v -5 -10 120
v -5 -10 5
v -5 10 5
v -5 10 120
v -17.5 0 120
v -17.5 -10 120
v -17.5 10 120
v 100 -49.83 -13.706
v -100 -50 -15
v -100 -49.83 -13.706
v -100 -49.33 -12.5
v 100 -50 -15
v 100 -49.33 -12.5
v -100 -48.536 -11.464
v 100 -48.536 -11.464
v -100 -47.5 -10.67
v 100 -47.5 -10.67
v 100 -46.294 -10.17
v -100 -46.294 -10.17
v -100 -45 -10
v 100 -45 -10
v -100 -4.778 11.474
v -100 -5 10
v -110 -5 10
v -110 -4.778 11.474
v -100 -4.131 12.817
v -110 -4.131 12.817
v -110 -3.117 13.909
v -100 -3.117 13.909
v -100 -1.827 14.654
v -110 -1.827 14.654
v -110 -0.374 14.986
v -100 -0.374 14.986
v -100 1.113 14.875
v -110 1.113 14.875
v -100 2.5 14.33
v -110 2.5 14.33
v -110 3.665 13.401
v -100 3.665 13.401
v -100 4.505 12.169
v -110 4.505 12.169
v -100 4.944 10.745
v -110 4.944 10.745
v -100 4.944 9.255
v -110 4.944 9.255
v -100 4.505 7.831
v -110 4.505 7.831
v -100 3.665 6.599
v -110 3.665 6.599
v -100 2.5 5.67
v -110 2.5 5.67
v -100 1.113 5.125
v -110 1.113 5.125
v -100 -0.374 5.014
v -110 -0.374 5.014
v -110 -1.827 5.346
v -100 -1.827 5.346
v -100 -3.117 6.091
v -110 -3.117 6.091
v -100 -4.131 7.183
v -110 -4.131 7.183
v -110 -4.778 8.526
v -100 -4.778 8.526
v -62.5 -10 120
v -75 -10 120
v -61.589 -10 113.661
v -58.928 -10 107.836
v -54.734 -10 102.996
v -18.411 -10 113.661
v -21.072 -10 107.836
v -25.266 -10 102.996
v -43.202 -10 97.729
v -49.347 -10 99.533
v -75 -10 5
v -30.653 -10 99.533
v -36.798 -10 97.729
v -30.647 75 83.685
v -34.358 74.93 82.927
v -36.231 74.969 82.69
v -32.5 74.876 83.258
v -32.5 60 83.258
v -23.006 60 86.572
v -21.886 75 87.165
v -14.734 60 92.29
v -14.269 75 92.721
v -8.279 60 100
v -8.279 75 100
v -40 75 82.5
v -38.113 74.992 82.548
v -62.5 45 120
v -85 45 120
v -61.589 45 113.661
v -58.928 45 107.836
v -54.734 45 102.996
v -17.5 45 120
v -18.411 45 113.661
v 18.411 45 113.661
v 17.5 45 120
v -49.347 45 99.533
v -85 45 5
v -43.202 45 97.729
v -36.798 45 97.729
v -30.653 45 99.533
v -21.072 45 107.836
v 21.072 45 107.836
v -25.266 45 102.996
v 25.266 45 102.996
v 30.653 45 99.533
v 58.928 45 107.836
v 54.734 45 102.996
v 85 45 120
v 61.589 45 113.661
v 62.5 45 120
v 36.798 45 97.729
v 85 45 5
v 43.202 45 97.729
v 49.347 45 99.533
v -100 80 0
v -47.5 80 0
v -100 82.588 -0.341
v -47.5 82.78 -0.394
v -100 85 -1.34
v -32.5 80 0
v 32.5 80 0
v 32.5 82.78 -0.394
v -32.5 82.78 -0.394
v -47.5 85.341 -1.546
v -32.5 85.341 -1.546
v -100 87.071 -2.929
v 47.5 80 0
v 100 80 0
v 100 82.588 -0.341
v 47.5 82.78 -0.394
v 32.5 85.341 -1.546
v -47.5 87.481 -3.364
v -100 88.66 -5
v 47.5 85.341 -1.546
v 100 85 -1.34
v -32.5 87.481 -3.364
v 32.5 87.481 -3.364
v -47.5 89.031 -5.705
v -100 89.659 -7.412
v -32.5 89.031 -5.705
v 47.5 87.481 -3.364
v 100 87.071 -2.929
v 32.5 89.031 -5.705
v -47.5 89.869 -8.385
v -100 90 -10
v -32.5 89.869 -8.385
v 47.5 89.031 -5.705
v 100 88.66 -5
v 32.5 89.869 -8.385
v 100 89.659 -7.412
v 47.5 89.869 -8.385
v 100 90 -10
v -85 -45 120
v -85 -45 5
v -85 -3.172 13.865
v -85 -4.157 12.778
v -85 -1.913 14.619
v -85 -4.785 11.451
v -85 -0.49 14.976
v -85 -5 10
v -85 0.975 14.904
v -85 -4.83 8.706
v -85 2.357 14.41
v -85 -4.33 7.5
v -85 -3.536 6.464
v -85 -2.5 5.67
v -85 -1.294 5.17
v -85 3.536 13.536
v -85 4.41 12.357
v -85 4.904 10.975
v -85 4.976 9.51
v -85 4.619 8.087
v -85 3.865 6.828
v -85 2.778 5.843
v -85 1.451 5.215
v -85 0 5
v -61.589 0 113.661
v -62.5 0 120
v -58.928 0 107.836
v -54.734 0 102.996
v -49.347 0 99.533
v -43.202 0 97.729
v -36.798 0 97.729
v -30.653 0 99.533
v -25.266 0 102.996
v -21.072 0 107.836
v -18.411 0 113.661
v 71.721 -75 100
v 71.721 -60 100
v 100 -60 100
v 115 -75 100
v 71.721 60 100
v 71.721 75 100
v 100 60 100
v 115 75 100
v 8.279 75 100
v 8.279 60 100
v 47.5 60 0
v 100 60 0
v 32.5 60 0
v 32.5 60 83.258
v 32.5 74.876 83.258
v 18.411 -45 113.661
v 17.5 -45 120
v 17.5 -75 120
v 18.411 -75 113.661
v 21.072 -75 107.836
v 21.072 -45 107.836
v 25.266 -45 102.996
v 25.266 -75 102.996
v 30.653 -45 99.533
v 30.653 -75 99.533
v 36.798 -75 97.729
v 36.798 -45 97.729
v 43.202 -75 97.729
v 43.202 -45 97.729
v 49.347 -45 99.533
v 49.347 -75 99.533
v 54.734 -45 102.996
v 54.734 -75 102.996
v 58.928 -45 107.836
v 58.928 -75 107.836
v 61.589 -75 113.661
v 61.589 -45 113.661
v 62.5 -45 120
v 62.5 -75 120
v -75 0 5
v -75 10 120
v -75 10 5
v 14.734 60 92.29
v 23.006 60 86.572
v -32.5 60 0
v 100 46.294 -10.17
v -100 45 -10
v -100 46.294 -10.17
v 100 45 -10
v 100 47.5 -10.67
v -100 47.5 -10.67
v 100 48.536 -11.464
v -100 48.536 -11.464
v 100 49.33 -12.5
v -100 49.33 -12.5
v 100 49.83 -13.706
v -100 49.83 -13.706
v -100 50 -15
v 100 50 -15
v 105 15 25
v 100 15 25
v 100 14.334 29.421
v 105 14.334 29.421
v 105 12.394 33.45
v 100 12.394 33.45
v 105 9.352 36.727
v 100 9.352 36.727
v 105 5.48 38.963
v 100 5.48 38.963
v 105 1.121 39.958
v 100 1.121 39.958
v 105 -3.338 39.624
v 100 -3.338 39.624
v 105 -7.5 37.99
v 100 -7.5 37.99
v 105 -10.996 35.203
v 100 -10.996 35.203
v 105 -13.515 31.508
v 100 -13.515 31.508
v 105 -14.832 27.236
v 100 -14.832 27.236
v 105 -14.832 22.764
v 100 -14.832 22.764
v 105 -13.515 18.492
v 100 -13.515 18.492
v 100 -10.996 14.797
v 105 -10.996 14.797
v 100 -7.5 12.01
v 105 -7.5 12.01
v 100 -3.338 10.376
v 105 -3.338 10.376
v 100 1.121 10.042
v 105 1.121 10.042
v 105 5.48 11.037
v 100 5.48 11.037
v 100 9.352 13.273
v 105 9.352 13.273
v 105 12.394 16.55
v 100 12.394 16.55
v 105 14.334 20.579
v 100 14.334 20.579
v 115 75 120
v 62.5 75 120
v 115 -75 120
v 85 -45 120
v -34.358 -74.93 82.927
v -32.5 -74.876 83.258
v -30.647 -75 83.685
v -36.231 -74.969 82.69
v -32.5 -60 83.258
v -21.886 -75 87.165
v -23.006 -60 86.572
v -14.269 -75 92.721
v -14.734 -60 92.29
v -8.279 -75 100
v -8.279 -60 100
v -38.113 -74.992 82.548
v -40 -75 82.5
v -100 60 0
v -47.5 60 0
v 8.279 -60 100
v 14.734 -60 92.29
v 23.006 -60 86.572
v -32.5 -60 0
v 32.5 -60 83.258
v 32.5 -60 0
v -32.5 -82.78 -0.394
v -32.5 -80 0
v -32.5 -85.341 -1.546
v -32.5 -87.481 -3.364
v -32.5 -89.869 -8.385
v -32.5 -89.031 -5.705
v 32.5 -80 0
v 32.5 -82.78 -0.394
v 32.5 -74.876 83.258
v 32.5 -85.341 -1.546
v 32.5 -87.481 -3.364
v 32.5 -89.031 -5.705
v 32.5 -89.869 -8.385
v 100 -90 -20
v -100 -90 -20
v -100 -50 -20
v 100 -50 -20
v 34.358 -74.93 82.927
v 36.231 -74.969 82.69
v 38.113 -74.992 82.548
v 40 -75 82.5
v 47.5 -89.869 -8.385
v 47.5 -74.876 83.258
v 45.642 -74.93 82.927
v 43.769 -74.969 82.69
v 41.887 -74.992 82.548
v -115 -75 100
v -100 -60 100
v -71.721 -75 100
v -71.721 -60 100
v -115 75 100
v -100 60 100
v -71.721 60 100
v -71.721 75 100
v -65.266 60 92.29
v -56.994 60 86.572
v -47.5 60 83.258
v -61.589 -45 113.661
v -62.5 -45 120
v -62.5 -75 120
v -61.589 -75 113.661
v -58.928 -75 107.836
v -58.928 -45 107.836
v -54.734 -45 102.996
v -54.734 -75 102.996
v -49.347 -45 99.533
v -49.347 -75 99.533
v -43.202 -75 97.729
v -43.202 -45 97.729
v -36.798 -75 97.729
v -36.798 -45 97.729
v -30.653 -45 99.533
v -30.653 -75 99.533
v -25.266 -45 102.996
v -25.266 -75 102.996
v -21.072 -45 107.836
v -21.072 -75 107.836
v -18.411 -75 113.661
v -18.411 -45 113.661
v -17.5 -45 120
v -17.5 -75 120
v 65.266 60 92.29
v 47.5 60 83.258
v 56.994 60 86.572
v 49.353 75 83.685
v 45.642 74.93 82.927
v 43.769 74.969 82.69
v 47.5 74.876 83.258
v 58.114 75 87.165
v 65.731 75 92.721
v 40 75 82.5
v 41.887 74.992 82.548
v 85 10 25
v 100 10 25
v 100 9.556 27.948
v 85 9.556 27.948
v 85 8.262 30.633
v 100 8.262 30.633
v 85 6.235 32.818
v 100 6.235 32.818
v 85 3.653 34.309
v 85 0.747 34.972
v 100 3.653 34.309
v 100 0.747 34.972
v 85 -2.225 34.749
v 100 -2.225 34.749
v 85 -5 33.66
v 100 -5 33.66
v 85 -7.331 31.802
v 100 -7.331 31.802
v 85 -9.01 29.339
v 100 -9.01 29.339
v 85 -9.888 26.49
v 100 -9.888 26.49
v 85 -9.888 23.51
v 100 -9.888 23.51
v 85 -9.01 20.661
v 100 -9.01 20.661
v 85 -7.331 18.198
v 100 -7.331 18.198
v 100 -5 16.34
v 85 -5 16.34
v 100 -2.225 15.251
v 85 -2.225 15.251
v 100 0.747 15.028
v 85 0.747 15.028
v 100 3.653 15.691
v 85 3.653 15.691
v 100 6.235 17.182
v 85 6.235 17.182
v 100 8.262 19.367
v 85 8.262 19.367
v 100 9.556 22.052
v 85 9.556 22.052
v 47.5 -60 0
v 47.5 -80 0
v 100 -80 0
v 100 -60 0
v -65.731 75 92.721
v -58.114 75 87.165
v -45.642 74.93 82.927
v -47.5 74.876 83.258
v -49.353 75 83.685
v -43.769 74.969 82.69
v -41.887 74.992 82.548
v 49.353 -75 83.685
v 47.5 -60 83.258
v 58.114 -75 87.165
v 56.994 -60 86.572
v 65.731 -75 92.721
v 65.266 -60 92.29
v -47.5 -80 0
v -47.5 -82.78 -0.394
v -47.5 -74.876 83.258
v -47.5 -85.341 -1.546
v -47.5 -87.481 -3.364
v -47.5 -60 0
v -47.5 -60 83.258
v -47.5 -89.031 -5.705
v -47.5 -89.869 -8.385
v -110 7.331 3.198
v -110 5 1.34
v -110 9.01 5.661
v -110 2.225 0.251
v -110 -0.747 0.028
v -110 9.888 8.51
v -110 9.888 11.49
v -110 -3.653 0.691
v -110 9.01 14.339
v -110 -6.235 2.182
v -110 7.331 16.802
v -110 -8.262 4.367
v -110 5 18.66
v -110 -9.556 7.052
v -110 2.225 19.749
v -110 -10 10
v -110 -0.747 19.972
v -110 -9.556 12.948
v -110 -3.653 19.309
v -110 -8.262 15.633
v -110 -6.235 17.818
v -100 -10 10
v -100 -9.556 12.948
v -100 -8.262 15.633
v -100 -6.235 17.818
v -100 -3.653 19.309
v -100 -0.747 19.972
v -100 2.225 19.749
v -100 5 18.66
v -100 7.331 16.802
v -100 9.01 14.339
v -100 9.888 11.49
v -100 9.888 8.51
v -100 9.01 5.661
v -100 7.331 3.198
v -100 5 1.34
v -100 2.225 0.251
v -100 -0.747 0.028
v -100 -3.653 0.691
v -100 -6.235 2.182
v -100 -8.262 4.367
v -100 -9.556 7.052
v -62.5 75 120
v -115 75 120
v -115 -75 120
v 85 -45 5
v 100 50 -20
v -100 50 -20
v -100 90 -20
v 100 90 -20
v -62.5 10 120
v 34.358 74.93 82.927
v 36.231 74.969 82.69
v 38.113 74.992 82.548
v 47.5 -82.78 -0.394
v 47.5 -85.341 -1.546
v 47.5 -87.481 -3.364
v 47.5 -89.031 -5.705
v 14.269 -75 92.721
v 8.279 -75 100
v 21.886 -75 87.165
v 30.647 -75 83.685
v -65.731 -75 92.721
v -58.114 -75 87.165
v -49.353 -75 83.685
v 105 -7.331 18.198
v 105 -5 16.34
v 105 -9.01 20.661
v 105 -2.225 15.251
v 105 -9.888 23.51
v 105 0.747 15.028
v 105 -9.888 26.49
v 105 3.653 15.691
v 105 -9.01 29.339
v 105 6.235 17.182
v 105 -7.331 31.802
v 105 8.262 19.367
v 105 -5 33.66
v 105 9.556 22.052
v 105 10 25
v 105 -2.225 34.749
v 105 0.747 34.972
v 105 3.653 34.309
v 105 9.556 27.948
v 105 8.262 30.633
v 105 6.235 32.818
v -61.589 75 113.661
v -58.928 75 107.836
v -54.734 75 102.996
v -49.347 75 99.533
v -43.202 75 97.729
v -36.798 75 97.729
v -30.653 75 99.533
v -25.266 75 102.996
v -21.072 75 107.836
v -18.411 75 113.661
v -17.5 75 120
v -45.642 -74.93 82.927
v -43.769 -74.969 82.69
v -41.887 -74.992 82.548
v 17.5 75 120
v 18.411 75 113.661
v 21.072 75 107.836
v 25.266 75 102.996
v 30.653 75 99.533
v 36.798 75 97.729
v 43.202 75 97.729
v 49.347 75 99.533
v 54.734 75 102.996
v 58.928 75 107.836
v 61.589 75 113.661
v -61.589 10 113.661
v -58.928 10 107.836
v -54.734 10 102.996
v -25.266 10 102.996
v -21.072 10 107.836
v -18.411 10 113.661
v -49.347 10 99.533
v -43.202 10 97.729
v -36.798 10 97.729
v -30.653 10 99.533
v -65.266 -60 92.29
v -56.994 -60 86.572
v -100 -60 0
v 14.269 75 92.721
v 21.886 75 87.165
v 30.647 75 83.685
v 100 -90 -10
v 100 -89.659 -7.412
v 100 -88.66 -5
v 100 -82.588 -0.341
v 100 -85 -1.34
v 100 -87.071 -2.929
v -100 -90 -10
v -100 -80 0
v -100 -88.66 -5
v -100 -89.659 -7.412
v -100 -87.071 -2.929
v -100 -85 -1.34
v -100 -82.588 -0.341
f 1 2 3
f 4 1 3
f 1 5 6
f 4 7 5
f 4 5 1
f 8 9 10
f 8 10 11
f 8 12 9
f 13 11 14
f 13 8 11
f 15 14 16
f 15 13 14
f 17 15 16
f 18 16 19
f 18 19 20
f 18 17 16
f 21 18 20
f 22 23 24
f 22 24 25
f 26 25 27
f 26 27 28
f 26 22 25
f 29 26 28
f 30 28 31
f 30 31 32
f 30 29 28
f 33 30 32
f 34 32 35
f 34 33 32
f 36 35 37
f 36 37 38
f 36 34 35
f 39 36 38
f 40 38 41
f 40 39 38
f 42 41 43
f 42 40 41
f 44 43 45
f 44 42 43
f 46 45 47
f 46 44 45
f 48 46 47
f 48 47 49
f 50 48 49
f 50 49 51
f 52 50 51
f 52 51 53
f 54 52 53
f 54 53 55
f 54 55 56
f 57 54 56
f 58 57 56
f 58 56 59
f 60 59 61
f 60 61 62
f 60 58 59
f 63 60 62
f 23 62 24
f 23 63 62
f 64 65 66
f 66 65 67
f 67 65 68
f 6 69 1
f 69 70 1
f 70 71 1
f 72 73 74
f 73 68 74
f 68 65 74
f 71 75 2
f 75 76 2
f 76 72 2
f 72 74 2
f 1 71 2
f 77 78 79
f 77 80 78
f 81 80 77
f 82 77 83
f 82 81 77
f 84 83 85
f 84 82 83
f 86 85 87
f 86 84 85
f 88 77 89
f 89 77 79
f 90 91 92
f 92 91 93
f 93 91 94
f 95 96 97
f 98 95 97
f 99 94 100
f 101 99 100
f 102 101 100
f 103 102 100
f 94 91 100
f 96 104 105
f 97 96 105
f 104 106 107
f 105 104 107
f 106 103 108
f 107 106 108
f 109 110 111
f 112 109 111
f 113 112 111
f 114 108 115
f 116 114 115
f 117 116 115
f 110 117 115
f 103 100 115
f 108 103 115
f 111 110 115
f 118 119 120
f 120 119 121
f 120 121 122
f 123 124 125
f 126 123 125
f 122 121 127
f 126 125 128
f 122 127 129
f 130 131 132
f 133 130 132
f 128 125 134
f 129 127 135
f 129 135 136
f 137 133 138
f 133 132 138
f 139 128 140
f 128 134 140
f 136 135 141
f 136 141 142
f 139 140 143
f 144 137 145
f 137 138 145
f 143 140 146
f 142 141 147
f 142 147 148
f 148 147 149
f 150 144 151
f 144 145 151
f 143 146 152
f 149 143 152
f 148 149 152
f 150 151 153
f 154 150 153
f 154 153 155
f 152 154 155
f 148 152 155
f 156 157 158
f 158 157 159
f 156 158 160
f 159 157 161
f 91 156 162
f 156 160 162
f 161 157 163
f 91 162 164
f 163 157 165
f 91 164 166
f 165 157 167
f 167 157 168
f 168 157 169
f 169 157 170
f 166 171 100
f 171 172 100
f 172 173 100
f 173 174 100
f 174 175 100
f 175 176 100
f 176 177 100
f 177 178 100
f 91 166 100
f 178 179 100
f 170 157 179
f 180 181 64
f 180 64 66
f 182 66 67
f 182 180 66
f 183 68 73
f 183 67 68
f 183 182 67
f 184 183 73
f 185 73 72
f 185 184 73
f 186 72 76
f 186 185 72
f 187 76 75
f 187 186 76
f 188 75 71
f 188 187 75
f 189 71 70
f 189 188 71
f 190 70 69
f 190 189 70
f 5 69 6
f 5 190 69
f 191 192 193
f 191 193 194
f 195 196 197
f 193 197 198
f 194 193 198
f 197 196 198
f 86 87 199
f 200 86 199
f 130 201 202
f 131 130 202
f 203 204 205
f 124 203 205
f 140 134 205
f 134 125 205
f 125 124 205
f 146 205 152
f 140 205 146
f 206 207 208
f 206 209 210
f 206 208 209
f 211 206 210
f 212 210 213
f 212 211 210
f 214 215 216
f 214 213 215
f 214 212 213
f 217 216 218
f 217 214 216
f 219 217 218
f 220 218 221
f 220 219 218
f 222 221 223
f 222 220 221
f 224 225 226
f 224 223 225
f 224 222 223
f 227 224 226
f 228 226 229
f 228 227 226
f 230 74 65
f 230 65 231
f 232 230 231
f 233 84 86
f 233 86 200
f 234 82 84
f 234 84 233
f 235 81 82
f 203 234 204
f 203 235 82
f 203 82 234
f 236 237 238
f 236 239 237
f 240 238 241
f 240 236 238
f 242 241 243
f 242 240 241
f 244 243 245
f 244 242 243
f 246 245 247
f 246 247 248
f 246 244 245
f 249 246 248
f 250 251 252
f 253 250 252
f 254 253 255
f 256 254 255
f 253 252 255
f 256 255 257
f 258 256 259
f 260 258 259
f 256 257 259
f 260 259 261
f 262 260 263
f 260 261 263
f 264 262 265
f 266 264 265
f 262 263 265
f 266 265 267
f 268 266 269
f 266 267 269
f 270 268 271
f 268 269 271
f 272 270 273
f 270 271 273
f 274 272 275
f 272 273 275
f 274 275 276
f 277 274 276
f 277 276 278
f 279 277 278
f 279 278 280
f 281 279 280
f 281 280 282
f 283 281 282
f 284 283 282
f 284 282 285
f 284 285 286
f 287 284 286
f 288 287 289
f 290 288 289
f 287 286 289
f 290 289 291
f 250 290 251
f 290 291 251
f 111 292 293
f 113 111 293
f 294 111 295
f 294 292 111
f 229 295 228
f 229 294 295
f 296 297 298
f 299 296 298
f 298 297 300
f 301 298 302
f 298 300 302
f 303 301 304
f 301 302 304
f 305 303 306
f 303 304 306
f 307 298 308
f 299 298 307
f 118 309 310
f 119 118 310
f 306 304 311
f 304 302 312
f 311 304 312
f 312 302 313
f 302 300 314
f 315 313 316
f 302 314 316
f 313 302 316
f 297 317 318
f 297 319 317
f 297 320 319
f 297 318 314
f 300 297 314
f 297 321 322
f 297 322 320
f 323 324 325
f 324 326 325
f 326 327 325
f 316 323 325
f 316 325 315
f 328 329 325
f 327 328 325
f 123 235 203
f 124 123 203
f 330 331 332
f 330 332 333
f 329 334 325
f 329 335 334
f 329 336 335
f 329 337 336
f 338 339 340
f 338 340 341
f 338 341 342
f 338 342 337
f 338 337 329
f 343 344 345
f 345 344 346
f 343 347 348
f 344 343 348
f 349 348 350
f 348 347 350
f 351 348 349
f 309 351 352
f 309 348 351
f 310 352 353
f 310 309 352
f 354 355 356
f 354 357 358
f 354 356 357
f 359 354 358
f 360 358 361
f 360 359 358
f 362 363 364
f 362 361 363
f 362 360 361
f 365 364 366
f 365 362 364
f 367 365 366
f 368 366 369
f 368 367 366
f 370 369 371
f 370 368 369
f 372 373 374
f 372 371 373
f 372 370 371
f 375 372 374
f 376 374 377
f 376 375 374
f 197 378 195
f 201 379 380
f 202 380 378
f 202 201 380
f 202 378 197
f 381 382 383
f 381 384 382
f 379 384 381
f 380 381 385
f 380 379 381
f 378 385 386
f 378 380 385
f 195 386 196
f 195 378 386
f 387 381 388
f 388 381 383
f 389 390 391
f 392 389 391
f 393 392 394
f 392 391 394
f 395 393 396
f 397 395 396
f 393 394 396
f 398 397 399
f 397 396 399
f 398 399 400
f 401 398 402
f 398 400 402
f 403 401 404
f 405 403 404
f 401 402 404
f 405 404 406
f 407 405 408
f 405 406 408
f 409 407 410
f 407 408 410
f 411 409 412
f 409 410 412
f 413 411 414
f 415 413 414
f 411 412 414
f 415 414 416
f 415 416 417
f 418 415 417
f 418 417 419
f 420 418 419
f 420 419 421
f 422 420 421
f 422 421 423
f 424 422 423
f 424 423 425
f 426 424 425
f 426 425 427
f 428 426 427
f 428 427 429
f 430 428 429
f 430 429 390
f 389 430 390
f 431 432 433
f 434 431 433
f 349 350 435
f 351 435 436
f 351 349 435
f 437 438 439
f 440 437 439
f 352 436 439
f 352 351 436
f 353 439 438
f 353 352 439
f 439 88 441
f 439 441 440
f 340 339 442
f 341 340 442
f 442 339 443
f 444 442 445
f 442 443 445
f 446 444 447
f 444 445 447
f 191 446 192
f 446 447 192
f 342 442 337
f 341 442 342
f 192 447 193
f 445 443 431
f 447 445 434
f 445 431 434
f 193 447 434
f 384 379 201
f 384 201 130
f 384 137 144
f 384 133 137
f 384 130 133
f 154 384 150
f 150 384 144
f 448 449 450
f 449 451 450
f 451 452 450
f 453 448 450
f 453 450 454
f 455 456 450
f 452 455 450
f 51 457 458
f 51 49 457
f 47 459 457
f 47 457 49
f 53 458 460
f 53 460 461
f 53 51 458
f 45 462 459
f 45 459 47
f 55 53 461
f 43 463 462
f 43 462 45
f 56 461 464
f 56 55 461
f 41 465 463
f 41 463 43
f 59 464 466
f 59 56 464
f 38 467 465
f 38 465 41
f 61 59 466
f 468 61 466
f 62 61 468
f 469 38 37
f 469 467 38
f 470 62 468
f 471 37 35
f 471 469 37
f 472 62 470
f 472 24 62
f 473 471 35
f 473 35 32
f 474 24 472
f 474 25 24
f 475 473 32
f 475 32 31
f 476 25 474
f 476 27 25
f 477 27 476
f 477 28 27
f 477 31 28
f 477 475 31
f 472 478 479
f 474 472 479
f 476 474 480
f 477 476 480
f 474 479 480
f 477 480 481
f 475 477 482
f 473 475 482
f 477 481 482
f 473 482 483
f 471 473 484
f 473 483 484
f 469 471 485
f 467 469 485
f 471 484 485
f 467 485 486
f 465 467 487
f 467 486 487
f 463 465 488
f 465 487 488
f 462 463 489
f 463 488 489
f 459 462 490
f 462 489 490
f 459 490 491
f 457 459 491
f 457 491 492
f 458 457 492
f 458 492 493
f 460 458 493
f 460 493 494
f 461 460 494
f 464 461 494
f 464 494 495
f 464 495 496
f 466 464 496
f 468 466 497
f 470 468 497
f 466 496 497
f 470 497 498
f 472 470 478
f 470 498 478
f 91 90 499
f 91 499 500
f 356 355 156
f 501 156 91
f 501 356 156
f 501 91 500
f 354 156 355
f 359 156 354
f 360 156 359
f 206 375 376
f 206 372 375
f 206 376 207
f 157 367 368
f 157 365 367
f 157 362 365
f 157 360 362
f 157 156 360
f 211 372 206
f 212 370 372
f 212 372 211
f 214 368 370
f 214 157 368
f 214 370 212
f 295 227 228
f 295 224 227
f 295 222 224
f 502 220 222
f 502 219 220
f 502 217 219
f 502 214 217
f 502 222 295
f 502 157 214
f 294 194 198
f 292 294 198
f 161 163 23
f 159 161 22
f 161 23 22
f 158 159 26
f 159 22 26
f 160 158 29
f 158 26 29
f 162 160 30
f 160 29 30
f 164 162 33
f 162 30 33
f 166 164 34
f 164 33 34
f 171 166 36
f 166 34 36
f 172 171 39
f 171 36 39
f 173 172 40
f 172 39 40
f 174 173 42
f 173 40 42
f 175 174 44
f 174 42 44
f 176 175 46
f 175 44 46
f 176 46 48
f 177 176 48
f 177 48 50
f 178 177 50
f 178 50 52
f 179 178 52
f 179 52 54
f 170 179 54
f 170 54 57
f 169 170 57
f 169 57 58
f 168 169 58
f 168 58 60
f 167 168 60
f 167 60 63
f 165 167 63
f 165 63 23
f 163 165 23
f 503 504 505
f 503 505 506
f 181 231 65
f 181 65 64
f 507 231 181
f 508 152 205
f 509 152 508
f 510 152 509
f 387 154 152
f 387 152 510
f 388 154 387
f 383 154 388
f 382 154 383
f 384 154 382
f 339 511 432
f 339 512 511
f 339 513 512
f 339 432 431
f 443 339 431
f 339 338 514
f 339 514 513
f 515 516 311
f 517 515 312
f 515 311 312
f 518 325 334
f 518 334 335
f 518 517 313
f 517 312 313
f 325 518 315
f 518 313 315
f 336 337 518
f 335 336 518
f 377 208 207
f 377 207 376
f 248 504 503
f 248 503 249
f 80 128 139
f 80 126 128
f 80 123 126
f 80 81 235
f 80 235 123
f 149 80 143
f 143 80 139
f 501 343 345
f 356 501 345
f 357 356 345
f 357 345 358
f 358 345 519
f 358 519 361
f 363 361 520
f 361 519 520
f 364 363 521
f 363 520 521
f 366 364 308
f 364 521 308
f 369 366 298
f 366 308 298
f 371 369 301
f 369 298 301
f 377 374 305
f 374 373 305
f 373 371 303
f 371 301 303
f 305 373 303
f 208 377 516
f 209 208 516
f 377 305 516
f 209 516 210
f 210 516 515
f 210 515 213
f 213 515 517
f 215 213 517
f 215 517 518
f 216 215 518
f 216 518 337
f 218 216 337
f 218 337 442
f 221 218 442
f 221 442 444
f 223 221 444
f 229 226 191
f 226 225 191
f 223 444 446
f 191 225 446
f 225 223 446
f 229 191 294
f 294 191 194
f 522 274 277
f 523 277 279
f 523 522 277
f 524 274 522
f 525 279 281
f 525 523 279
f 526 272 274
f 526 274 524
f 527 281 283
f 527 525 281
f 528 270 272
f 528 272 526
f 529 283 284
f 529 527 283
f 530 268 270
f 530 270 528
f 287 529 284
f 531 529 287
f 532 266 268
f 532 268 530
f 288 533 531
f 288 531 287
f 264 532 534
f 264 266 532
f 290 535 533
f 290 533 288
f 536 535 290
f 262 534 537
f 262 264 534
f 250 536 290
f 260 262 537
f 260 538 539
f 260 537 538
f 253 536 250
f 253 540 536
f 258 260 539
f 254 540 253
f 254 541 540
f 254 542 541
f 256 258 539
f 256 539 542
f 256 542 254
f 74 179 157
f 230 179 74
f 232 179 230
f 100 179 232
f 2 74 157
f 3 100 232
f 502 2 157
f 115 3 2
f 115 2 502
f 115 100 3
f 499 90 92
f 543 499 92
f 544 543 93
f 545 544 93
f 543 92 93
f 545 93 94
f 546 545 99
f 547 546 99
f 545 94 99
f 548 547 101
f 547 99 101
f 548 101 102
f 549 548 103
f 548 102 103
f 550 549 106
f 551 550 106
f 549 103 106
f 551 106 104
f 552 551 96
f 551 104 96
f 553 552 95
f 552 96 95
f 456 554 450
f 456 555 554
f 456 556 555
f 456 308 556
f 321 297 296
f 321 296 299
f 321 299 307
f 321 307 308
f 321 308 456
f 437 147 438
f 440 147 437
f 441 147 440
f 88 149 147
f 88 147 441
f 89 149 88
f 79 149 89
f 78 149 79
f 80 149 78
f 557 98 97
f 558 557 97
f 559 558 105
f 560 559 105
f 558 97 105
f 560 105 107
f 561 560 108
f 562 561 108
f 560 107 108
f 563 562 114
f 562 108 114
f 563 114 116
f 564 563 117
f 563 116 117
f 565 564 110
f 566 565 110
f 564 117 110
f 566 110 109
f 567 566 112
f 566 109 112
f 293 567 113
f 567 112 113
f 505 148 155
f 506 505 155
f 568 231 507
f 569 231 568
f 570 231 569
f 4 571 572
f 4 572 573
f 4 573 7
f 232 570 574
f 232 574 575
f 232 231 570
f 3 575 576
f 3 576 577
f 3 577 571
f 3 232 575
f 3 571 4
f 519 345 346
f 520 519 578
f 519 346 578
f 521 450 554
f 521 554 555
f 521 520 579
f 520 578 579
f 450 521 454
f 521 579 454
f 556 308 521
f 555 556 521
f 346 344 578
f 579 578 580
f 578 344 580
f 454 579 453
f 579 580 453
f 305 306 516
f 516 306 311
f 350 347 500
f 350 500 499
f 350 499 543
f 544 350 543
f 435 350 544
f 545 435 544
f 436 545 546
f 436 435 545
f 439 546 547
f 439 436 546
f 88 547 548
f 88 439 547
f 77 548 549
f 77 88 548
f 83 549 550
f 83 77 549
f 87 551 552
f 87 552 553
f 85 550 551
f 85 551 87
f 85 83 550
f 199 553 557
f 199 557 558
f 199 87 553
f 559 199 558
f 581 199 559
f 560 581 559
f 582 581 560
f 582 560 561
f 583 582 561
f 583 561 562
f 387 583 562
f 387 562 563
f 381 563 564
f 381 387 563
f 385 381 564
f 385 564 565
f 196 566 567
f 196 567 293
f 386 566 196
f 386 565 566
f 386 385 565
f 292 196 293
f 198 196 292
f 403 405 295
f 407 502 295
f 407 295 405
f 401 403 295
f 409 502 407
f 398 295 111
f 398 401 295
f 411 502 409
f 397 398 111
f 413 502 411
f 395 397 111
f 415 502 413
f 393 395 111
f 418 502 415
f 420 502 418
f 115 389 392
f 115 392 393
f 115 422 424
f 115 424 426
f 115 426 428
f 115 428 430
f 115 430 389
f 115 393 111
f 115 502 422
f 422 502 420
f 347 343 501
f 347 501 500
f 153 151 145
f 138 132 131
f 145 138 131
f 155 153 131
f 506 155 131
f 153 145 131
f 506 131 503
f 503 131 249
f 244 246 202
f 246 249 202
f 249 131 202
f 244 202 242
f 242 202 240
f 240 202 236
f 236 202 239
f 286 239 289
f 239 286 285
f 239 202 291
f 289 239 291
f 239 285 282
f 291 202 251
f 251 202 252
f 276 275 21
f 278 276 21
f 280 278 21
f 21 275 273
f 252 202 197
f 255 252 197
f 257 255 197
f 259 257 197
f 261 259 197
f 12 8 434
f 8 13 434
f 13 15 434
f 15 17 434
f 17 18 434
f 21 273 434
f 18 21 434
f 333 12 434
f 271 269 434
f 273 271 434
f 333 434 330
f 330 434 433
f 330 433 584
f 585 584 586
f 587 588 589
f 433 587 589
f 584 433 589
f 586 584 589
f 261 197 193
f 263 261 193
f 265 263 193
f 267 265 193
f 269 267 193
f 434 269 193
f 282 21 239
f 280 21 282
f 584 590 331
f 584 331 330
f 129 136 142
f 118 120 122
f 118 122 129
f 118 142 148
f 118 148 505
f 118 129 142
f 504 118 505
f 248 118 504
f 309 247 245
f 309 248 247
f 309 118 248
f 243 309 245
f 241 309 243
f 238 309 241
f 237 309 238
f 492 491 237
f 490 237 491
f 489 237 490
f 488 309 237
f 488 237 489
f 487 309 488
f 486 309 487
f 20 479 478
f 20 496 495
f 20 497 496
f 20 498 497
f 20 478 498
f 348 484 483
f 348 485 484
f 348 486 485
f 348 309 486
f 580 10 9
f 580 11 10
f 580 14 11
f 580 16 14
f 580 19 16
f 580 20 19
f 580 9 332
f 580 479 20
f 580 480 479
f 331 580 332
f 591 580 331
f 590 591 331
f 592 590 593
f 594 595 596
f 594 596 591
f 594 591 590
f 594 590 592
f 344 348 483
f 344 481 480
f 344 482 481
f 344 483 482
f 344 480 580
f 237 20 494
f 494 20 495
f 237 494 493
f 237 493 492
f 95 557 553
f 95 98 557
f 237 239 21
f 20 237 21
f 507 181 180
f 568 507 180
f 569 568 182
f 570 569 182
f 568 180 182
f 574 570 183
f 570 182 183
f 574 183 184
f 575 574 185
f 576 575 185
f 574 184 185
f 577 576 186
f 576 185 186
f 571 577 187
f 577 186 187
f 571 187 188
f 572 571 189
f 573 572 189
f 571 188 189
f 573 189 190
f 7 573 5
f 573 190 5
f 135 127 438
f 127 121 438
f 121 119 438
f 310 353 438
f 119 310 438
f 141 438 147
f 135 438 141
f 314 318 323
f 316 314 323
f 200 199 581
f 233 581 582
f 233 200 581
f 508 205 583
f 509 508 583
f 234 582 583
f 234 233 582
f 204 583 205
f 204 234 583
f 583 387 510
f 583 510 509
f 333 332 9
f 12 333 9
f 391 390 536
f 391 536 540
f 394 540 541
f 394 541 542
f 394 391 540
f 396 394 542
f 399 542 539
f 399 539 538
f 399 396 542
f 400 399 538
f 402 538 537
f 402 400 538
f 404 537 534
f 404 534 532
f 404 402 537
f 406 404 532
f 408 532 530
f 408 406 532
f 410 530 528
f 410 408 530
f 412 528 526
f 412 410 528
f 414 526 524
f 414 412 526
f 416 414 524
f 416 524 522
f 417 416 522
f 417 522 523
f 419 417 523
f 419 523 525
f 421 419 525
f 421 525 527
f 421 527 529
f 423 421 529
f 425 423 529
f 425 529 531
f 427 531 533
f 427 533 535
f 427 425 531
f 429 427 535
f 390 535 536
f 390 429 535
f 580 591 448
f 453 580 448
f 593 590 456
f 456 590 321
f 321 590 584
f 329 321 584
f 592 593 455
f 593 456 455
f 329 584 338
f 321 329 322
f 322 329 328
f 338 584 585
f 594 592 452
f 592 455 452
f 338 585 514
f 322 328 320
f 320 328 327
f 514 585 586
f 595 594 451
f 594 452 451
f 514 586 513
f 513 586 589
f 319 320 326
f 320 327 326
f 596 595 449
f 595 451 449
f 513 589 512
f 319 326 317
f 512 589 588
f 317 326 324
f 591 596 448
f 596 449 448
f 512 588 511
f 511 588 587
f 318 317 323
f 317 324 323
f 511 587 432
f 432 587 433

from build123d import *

# Parameters (mm, degrees)
F0_W           = 200
F0_H           = 120
F1_DEPTH       = 100
F2_T           = -15
F3_W           = 230
F3_H           = 150
F3_W_2         = 170
F3_H_2         = 90
F4_DEPTH       = 20
F5_W           = 200
F5_H           = 180
F6_DEPTH       = 20
F7_W           = 100
F7_H           = 10
F8_DEPTH       = 200
F9_R           = 5
F11_DEPTH      = 75
F11_DEPTH_BACK = 75
F12_DEPTH      = 45
F12_DEPTH_BACK = 45
F13_R          = 22.5
F14_DEPTH      = 200
F14_DEPTH_BACK = 200
F15_R          = 10
F19_DEPTH      = 7.5
F19_DEPTH_BACK = 7.5
F21_DEPTH      = 7.5
F21_DEPTH_BACK = 7.5
F22_DEPTH      = 200
F22_DEPTH_BACK = 200
F23_DEPTH      = 10
F24_R          = 10
F24_R_2        = 5
F25_DEPTH      = 10
F26_DEPTH      = 25
F27_R          = 15
F27_R_2        = 10
F28_DEPTH      = 5
F29_DEPTH      = 25
F30_W          = 70
F30_H          = 20
F31_DEPTH      = 115
F32_DEPTH      = 25
F32_DEPTH_BACK = 25


with BuildPart() as f1:
    # F0 (on Top) → F1 (new body)
    with BuildSketch(Plane.XY):
        Rectangle(F0_W, F0_H)
    extrude(amount=F1_DEPTH)

    # F2
    f2_openings = [f1.faces().sort_by_distance(p)[0] for p in [
        (0, 0, 100),
    ]]
    offset(amount=F2_T, openings=f2_openings)

    # F3 (on face) → F4 (join)
    with BuildSketch(Plane.XY.offset(100)):
        Rectangle(F3_W, F3_H)
        Rectangle(F3_W_2, F3_H_2, mode=Mode.SUBTRACT)
    extrude(amount=F4_DEPTH)

    # F5 (on face) → F6 (join)
    with BuildSketch(Plane(origin=(0, 0, 0), x_dir=(1, 0, 0), z_dir=(0, 0, -1))):
        Rectangle(F5_W, F5_H)
    extrude(amount=F6_DEPTH)

    # F7 (on face) → F8 (cut)
    with BuildSketch(Plane(origin=(-100, 0, 0), x_dir=(0, -1, 0), z_dir=(-1, 0, 0))):
        with Locations((0, -15)):
            Rectangle(F7_W, F7_H)
    extrude(amount=-F8_DEPTH, mode=Mode.SUBTRACT)

    # F9
    f9_edges = [f1.edges().sort_by_distance(p)[0] for p in [
        (0, -50, -10),
        (0, 50, -10),
    ]]
    fillet(f9_edges, radius=F9_R)

    # F10 (on Front) → F11 (join, two sides)
    with BuildSketch(Plane.XZ) as f11_sk:
        with BuildLine():
            Line((-2.5, 120), (-77.5, 120))
            ThreePointArc((-77.5, 120), (-40, 82.5), (-2.5, 120))
        make_face()
        with BuildLine():
            Line((77.5, 120), (2.5, 120))
            ThreePointArc((2.5, 120), (40, 82.5), (77.5, 120))
        make_face()
    extrude(amount=F11_DEPTH)
    extrude(f11_sk.sketch, amount=-F11_DEPTH_BACK)

    # F10 (on Front) → F12 (cut, two sides)
    with BuildSketch(Plane.XZ) as f12_sk:
        with BuildLine():
            Line((-2.5, 120), (-77.5, 120))
            ThreePointArc((-77.5, 120), (-40, 82.5), (-2.5, 120))
        make_face()
        with BuildLine():
            Line((77.5, 120), (2.5, 120))
            ThreePointArc((2.5, 120), (40, 82.5), (77.5, 120))
        make_face()
    extrude(amount=F12_DEPTH, mode=Mode.SUBTRACT)
    extrude(f12_sk.sketch, amount=-F12_DEPTH_BACK, mode=Mode.SUBTRACT)

    # F13 (on Front) → F14 (cut, two sides)
    with BuildSketch(Plane.XZ) as f14_sk:
        with Locations((-40, 120)):
            Circle(F13_R)
        with Locations((40, 120)):
            Circle(F13_R)
    extrude(amount=-F14_DEPTH, mode=Mode.SUBTRACT)
    extrude(f14_sk.sketch, amount=F14_DEPTH_BACK, mode=Mode.SUBTRACT)

    # F15
    f15_edges = [f1.edges().sort_by_distance(p)[0] for p in [
        (0, -90, 0),
        (0, 90, 0),
    ]]
    fillet(f15_edges, radius=F15_R)

    # F18 (on offset) → F19 (join, two sides)
    with BuildSketch(Plane.YZ.offset(40)) as f19_sk:
        Polygon((75, 82.5), (72.1370113349, 100), (60, 100), (60, 82.5), align=None)
        Polygon((89.8688040333, -8.3854700523), (75, 82.5), (60, 82.5), (60, -8.3854700523), align=None)
        Polygon((-60, 100), (-72.1370113349, 100), (-89.8688040333, -8.3854700523), (-60, -8.3854700523), align=None)
    extrude(amount=F19_DEPTH)
    extrude(f19_sk.sketch, amount=-F19_DEPTH_BACK)

    # F20 (on offset) → F21 (join, two sides)
    with BuildSketch(Plane.YZ.offset(-40)) as f21_sk:
        Polygon((89.8688040333, -8.3854700523), (72.1370113349, 100), (60, 100), (60, -8.3854700523), align=None)
        Polygon((-89.8688040333, -8.3854700523), (-60, -8.3854700523), (-60, 100), (-72.1370113349, 100), align=None)
    extrude(amount=F21_DEPTH)
    extrude(f21_sk.sketch, amount=-F21_DEPTH_BACK)

    # F13 (on Front) → F22 (cut, two sides)
    with BuildSketch(Plane.XZ) as f22_sk:
        with Locations((-40, 120)):
            Circle(F13_R)
        with Locations((40, 120)):
            Circle(F13_R)
    extrude(amount=-F22_DEPTH, mode=Mode.SUBTRACT)
    extrude(f22_sk.sketch, amount=F22_DEPTH_BACK, mode=Mode.SUBTRACT)

    # F23 (cut): a face of the model
    f23_faces = [f1.faces().sort_by_distance(p)[0] for p in [
        (0, 0, 15),
    ]]
    extrude(f23_faces, amount=-F23_DEPTH, mode=Mode.SUBTRACT)

    # F24 (on face) → F25 (join)
    with BuildSketch(Plane(origin=(-100, 0, 0), x_dir=(0, -1, 0), z_dir=(-1, 0, 0))):
        with Locations((0, 10)):
            Circle(F24_R)
        with Locations((0, 10)):
            Circle(F24_R_2, mode=Mode.SUBTRACT)
    extrude(amount=F25_DEPTH)

    # F26 (cut): a face of the model
    f26_faces = [f1.faces().sort_by_distance(p)[0] for p in [
        (-100, 0, 10),
    ]]
    extrude(f26_faces, amount=-F26_DEPTH, mode=Mode.SUBTRACT)

    # F27 (on face) → F28 (join)
    with BuildSketch(Plane.YZ.offset(100)):
        with Locations((0, 25)):
            Circle(F27_R)
        with Locations((0, 25)):
            Circle(F27_R_2, mode=Mode.SUBTRACT)
    extrude(amount=F28_DEPTH)

    # F29 (cut): a face of the model
    f29_faces = [f1.faces().sort_by_distance(p)[0] for p in [
        (100, 0, 25),
    ]]
    extrude(f29_faces, amount=-F29_DEPTH, mode=Mode.SUBTRACT)

    # F30 (on face) → F31 (join, through all)
    with BuildSketch(Plane.XY.offset(5)):
        with Locations((-40, 0)):
            Rectangle(F30_W, F30_H)
    extrude(amount=F31_DEPTH)

    # F13 (on Front) → F32 (cut, two sides)
    with BuildSketch(Plane.XZ) as f32_sk:
        with Locations((-40, 120)):
            Circle(F13_R)
        with Locations((40, 120)):
            Circle(F13_R)
    extrude(amount=-F32_DEPTH, mode=Mode.SUBTRACT)
    extrude(f32_sk.sketch, amount=F32_DEPTH_BACK, mode=Mode.SUBTRACT)


solid = f1.part
